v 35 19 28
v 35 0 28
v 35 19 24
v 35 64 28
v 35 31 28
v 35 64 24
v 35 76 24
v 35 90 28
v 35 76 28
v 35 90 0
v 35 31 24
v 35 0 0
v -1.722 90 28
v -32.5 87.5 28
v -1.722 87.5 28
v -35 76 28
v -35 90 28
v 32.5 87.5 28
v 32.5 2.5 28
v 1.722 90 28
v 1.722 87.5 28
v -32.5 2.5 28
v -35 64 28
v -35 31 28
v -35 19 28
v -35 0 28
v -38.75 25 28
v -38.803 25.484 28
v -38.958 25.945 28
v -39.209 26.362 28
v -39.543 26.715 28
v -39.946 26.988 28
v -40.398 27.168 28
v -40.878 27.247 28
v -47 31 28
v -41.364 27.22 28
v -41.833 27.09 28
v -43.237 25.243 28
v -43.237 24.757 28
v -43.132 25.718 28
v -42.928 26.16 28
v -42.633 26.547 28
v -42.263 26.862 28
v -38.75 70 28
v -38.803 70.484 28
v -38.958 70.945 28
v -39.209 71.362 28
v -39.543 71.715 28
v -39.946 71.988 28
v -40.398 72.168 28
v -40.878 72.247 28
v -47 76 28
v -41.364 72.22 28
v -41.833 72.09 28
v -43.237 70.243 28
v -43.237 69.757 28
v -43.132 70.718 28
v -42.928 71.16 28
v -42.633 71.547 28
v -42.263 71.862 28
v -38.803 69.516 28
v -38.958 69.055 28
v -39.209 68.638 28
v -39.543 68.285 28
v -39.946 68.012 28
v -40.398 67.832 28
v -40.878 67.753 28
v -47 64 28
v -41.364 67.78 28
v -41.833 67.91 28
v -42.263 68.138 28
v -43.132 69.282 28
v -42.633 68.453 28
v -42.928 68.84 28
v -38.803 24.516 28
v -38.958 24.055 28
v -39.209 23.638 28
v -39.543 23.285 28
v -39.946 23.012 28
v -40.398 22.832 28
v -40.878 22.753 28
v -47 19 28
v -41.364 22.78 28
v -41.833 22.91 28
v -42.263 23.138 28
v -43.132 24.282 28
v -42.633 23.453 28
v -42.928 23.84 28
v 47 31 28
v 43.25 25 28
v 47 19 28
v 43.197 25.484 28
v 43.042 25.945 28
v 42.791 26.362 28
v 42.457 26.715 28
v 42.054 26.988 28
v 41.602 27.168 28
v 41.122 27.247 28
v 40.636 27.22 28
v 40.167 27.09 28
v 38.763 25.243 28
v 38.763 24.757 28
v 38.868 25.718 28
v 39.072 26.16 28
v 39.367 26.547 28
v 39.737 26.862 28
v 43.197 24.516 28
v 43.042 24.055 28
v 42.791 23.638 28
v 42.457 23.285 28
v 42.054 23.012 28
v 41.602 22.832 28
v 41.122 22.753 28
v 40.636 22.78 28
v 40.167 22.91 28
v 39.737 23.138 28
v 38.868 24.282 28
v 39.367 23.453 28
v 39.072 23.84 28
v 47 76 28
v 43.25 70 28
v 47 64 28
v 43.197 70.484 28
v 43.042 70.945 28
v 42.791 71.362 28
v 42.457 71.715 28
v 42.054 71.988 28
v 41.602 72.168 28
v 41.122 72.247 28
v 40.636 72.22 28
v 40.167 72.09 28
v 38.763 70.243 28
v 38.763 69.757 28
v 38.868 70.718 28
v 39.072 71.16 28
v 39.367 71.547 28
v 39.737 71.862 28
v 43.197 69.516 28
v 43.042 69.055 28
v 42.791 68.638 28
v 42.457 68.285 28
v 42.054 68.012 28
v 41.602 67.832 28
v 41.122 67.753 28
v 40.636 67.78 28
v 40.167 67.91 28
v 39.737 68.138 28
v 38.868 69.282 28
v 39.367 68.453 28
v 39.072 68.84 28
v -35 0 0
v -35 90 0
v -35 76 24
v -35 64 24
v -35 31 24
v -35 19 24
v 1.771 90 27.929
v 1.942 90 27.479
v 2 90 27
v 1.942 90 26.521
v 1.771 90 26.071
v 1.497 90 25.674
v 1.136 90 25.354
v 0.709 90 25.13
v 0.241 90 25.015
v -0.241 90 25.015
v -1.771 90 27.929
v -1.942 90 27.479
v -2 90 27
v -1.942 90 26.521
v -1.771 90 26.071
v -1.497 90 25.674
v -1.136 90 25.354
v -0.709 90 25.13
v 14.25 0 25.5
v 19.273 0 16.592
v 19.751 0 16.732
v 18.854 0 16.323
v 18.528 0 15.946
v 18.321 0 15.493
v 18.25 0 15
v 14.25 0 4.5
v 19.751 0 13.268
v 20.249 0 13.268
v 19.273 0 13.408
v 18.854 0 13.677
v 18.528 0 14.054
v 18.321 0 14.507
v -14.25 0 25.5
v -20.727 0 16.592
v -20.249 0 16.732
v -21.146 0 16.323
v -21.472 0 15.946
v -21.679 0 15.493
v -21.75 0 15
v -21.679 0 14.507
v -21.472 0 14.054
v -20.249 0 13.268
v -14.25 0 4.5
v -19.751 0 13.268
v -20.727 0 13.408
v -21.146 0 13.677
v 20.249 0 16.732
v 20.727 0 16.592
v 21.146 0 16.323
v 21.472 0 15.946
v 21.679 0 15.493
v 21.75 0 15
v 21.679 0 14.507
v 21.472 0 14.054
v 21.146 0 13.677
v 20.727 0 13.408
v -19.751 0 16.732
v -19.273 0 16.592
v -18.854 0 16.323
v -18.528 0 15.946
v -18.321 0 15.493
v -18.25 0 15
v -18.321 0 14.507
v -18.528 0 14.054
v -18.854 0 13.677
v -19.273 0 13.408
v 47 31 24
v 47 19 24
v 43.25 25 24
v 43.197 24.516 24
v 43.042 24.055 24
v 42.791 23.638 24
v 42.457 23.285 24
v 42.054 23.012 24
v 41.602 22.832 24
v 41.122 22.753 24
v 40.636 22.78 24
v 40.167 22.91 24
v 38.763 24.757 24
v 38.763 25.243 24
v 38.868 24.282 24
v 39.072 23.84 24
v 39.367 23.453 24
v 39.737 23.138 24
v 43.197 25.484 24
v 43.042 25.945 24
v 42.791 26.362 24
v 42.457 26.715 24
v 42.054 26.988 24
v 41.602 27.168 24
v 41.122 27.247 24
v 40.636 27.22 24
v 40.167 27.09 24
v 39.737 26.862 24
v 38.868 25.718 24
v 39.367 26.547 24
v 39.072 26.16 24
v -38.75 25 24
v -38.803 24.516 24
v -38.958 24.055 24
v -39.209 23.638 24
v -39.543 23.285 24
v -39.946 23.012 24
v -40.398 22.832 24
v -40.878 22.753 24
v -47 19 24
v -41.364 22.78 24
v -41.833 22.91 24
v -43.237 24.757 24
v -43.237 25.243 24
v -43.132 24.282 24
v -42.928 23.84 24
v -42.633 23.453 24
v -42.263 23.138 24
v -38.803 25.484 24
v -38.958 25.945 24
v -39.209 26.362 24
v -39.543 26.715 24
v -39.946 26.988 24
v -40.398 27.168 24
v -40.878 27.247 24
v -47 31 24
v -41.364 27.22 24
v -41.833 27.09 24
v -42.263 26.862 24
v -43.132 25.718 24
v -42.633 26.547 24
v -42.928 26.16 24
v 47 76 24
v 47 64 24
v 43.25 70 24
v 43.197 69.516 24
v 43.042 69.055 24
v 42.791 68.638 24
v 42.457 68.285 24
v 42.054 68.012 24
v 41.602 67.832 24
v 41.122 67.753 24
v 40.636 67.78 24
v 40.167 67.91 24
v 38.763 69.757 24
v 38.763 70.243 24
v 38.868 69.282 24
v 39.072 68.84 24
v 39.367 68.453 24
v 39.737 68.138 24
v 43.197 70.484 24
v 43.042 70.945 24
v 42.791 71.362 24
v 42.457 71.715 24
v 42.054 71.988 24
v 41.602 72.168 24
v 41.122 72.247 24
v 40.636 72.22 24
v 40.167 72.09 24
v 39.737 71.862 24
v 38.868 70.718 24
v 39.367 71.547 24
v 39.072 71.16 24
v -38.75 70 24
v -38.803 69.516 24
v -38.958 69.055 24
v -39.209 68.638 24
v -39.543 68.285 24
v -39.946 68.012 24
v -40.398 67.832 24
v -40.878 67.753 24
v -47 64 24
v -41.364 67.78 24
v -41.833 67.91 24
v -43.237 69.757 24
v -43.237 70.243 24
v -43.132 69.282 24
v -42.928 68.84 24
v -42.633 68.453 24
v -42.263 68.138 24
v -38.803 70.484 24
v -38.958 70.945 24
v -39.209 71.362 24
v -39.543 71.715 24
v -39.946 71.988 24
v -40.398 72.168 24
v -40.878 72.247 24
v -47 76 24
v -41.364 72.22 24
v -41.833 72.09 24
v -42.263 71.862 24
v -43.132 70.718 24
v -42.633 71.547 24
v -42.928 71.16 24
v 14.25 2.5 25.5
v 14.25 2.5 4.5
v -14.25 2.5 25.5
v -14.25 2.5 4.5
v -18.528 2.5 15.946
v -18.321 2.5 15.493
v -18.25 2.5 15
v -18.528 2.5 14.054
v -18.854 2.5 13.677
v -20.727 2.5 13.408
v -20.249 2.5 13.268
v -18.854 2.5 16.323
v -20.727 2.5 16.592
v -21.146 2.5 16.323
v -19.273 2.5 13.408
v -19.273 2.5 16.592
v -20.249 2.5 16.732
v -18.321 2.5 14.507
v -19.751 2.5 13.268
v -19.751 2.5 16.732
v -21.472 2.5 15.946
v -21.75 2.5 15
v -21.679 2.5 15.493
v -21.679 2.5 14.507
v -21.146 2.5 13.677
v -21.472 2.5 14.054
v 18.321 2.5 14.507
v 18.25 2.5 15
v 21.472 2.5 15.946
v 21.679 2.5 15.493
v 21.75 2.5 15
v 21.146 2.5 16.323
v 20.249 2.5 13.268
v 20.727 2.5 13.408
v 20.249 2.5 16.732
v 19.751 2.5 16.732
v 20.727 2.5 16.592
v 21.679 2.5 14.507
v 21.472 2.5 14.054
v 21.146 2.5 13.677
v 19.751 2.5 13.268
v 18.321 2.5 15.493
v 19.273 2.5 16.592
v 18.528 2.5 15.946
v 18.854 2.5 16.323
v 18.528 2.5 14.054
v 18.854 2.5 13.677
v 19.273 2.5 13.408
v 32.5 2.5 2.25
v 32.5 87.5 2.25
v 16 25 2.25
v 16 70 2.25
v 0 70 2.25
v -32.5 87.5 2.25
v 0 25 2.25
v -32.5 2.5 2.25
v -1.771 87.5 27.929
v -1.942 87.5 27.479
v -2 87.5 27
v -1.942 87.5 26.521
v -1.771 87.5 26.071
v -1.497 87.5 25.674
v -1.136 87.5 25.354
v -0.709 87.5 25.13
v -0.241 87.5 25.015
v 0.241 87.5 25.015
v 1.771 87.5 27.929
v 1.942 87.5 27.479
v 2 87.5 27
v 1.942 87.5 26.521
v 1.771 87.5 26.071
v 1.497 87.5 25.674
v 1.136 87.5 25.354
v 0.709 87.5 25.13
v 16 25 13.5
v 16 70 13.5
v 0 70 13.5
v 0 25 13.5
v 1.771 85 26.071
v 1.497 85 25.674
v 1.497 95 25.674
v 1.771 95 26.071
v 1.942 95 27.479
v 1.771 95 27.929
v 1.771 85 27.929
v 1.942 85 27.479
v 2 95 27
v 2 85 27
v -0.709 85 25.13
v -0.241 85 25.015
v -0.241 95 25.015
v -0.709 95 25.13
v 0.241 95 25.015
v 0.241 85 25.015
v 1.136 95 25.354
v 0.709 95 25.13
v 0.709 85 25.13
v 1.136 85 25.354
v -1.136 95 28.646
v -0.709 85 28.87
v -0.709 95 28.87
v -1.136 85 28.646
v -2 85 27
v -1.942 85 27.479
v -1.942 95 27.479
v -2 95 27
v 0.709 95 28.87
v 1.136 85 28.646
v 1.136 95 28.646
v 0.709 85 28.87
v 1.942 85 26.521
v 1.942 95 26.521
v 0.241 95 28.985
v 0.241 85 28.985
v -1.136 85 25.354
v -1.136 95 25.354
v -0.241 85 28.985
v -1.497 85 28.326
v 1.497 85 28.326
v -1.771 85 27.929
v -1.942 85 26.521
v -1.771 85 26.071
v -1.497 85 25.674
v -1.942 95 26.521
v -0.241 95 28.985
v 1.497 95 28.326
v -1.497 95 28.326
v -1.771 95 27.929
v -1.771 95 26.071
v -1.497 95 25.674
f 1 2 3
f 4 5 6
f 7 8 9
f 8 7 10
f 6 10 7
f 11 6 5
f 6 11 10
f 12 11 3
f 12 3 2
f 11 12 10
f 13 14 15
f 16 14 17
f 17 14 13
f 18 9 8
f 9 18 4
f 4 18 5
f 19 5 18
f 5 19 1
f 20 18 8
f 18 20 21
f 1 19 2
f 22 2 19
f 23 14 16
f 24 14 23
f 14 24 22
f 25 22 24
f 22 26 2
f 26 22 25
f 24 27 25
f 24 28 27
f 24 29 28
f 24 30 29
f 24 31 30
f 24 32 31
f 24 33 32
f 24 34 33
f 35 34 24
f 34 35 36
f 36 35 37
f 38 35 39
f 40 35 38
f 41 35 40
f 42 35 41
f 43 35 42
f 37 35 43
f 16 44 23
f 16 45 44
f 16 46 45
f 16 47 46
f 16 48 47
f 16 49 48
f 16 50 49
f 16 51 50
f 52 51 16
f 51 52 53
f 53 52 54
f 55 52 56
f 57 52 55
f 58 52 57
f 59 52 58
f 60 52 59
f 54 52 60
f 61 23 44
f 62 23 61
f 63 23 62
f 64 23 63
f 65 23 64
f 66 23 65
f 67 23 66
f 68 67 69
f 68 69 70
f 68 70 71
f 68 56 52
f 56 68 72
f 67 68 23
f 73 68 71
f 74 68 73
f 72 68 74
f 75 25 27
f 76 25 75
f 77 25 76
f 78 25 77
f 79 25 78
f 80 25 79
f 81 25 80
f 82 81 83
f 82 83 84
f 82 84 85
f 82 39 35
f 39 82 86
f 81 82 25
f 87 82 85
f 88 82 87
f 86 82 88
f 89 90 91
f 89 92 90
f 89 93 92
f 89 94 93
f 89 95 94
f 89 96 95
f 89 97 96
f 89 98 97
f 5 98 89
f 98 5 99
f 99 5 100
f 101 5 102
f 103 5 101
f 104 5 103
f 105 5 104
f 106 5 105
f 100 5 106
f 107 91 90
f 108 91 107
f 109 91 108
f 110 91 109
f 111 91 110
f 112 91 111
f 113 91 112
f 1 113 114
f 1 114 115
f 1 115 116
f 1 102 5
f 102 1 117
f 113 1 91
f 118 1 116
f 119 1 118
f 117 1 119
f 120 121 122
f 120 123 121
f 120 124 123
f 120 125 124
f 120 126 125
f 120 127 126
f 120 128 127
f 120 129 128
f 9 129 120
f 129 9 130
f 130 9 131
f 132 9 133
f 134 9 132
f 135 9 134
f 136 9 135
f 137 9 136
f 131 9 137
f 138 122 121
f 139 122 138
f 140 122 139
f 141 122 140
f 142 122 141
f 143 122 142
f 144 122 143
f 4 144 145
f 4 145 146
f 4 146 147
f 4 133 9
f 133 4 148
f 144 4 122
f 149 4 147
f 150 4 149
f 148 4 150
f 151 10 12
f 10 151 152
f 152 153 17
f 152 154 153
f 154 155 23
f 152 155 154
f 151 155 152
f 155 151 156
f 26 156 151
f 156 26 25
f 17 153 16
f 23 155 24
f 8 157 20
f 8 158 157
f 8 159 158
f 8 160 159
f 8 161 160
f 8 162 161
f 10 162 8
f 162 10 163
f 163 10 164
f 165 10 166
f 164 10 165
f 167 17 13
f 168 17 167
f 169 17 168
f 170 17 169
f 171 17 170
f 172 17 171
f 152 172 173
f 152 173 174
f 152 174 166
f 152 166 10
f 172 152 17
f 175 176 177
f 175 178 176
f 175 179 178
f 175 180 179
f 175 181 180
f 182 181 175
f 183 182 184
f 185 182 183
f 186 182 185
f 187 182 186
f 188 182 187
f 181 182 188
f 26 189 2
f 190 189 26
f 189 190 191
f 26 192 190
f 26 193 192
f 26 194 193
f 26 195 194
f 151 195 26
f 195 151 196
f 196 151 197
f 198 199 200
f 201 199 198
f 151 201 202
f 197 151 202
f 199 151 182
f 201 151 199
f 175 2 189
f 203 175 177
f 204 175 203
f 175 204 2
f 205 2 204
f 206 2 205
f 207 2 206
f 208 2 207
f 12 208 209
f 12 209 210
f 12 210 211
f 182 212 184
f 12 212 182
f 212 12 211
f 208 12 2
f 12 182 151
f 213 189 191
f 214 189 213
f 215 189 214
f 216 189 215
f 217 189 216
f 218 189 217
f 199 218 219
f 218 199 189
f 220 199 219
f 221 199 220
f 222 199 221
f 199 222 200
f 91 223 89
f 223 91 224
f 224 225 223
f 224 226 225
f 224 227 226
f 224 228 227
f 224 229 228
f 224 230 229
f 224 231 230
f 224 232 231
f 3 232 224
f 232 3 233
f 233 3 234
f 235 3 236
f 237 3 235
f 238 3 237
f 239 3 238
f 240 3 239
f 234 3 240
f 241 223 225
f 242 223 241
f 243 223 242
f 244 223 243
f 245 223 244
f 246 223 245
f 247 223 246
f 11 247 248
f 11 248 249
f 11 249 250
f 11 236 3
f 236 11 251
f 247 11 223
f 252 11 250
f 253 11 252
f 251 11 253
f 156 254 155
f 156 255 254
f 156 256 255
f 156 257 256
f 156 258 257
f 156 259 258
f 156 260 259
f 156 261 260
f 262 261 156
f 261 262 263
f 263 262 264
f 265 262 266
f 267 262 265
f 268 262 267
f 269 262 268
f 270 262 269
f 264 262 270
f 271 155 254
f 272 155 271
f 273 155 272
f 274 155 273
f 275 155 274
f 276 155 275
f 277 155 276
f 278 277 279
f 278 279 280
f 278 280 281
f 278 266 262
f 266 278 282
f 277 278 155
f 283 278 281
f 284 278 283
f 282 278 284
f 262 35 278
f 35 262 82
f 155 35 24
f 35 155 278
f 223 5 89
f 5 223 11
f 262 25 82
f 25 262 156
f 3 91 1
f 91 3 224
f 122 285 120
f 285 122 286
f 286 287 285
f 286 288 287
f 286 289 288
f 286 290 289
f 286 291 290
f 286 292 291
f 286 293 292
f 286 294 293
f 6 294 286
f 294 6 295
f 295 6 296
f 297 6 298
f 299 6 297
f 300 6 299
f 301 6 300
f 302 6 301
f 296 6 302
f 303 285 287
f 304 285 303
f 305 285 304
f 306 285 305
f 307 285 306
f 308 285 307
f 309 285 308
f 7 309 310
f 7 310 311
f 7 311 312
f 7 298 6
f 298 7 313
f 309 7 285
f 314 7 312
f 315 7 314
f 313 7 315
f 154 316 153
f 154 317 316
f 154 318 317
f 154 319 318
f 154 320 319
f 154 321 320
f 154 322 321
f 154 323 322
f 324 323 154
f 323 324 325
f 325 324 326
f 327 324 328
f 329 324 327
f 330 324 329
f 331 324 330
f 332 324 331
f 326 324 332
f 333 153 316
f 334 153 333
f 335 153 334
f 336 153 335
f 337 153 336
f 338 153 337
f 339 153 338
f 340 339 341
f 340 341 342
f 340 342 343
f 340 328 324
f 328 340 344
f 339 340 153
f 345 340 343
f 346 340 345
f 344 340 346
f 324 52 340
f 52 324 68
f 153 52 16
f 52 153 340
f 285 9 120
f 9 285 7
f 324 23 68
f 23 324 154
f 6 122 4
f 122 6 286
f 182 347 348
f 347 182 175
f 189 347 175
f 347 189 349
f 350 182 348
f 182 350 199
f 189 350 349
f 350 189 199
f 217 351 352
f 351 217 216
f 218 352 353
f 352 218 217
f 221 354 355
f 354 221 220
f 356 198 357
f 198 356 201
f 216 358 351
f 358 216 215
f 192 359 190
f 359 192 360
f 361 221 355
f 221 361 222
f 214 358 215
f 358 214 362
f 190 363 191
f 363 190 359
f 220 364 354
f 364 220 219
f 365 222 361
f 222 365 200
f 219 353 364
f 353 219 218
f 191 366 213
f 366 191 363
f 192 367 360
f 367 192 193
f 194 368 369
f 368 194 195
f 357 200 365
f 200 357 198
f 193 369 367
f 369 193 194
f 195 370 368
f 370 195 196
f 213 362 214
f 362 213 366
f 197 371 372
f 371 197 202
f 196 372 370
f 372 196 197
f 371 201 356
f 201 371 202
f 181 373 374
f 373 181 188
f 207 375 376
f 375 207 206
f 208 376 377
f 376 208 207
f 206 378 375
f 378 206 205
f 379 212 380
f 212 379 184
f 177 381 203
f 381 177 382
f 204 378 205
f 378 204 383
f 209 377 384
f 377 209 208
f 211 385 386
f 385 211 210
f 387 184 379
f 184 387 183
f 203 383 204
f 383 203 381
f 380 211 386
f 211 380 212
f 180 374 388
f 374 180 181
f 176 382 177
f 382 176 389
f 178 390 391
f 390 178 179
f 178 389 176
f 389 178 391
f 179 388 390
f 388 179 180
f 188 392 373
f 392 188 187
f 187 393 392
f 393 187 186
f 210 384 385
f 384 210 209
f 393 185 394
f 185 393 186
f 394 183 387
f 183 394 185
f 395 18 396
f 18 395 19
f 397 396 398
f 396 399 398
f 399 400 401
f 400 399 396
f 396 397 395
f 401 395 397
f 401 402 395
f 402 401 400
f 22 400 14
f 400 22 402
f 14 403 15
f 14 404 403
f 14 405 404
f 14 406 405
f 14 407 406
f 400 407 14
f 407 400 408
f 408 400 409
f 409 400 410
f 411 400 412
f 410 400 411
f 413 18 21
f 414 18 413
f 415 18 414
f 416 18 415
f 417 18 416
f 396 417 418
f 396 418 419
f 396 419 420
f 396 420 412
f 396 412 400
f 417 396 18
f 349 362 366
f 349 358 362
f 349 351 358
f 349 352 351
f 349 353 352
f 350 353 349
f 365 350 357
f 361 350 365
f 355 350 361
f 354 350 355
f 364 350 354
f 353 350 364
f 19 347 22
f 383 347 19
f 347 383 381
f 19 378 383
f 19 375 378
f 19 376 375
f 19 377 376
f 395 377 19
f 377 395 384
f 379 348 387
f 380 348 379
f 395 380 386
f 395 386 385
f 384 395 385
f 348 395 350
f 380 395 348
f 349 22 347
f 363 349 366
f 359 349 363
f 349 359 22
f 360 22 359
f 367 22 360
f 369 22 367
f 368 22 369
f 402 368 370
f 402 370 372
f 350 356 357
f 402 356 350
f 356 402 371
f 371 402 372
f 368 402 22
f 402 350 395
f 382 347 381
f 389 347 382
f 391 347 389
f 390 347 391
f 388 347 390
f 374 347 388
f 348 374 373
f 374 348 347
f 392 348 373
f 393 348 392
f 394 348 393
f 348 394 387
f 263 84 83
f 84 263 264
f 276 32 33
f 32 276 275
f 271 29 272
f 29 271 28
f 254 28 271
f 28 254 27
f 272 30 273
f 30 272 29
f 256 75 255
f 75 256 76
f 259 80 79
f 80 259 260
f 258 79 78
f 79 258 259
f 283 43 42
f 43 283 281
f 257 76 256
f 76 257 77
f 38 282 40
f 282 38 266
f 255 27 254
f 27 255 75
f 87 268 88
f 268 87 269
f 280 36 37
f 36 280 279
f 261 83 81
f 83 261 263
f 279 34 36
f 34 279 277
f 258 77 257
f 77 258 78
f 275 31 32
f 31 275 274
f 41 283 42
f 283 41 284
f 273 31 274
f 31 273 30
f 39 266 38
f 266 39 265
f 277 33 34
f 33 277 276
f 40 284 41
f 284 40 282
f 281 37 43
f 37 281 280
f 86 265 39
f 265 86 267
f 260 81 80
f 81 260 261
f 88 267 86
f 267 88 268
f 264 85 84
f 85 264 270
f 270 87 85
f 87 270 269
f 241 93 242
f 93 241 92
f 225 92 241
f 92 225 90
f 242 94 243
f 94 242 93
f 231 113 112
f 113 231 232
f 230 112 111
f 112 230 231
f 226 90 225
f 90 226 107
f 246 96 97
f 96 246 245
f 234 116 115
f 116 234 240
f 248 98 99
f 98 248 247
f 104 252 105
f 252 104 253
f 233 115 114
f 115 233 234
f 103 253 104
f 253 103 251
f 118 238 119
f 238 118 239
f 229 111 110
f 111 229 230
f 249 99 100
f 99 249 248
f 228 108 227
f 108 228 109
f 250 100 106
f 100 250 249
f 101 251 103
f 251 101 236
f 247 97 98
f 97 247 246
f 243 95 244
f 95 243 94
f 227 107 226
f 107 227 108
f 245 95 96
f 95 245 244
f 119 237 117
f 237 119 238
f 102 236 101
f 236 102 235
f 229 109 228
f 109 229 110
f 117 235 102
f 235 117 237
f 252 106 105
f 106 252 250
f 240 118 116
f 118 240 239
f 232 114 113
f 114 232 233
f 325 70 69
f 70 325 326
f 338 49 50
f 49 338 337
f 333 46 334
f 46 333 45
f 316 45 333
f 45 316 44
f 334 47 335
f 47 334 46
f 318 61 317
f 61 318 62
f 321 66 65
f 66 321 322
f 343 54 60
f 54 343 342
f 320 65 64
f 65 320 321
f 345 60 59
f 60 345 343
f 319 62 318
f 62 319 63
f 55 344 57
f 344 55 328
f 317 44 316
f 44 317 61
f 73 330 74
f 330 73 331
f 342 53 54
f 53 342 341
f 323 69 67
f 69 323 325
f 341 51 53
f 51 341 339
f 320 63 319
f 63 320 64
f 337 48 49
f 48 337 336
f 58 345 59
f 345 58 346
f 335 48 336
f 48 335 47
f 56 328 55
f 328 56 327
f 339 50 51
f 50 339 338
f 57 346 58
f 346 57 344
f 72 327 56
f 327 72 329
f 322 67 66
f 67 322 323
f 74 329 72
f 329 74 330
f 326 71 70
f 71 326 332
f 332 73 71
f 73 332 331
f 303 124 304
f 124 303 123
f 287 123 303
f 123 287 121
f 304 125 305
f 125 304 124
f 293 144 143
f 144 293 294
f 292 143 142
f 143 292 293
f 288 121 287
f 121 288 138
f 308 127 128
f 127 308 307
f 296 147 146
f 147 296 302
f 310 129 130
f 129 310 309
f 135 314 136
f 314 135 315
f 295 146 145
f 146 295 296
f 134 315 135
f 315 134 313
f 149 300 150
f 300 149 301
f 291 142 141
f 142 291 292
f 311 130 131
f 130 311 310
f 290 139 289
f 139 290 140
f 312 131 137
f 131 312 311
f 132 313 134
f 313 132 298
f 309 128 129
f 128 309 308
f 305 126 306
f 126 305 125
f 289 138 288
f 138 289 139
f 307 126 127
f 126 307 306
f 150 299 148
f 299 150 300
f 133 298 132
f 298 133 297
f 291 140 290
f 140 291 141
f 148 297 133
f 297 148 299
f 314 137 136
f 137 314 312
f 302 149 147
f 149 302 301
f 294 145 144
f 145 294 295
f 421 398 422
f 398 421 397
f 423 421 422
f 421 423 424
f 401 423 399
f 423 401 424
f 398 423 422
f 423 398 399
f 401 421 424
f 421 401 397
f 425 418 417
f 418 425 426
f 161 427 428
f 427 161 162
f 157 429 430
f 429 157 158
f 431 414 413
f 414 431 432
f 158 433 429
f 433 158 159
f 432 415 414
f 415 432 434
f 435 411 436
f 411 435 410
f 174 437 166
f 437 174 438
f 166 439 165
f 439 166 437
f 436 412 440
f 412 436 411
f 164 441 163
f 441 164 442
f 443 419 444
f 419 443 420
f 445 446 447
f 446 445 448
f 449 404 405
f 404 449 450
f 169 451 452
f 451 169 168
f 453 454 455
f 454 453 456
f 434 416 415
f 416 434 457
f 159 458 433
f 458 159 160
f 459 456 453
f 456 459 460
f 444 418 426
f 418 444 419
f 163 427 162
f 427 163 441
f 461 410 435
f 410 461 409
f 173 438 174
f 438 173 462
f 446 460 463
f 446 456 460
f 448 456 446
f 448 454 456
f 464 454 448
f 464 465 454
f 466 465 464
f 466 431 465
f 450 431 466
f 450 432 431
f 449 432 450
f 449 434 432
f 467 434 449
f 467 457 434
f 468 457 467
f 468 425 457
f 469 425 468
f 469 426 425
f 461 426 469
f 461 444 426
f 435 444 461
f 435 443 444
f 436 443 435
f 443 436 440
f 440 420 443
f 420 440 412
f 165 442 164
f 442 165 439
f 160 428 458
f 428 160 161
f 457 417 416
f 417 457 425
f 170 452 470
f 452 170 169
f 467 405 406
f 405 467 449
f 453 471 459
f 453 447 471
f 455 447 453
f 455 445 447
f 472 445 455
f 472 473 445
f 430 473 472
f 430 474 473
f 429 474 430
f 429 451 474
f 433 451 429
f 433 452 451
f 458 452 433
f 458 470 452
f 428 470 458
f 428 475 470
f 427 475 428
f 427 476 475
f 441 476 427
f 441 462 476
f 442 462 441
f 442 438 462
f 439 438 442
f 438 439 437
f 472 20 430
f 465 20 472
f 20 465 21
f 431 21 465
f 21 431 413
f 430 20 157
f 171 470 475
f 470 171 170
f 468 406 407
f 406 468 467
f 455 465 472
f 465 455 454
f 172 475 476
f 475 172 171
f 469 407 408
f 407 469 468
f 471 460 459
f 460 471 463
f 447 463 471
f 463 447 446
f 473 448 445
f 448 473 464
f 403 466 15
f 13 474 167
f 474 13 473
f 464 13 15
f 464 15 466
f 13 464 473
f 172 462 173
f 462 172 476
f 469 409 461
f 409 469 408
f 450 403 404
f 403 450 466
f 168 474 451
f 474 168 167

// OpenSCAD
// shroud to cover AC wiring
$fa = 1;
$fs = 0.5;

// "length" is along X axis
// "width" is along Y axis
// "height" is along Z axis

width = 70;
length = 90;
height = 28;
wall_t = 2.5;
floor_t = 1.5;
mount_offset = 25;  // from X=0 to closest mounting holes
mount_pitch = 45;   // between mounting holes
mount_length = 12;  // length of mount tabs
mount_width = 12;   // width of mount tabs
mount_hole_d = 4.5; // for M4 bolt
socket_length = 25; // length of IEC socket into housing

translate([0,socket_length,floor_t])
cube([16,45,12]);

translate([0,length+2*wall_t,height-1])
rotate([90,0,0])
cylinder(d=4, h=4*wall_t);



difference() {
    union() {
       // outer shell of enclosure
       translate([0,length/2,height/2])
       cube(size=[width,length,height],center=true);
        
       // mounting tabs 
       translate([0,mount_offset,height-2])
       cube(size=[width+(mount_width*2),mount_length,4],center=true);
        
       // more mounting tabs 
       translate([0,mount_offset+mount_pitch,height-2])
       cube(size=[width+(mount_width*2),mount_length,4],center=true);
    }
    // remove inner volume of enclosure
       translate([0,length/2,height/2+floor_t*2])
       cube(size=[width-2*wall_t,length-2*wall_t,height+floor_t],center=true);   

    // remove IEC power entry mounting area
    translate([0,0,15])
    {
       // from datasheet of IEC entry units
       // cutout for Schurter P/N 6100-3
       cube(size=[28.5,10,21],center=true);

       // mounting holes
       translate([-20,5,0])
       rotate([90,0,0])
       cylinder(d=3.5, h=10);
       translate([20,5,0])
       rotate([90,0,0])
       cylinder(d=3.5, h=10);
    }
    
    // remove mounting tab holes
    translate([-(width+mount_width)/2,mount_offset,0])
    cylinder(d=mount_hole_d, h=height*2);
    
    translate([(width+mount_width)/2,mount_offset,0])
    cylinder(d=mount_hole_d, h=height*2);

    translate([-(width+mount_width)/2,mount_offset+mount_pitch,0])
    cylinder(d=mount_hole_d, h=height*2);
    
    translate([(width+mount_width)/2,mount_offset+mount_pitch,0])
    cylinder(d=mount_hole_d, h=height*2);
    
}
